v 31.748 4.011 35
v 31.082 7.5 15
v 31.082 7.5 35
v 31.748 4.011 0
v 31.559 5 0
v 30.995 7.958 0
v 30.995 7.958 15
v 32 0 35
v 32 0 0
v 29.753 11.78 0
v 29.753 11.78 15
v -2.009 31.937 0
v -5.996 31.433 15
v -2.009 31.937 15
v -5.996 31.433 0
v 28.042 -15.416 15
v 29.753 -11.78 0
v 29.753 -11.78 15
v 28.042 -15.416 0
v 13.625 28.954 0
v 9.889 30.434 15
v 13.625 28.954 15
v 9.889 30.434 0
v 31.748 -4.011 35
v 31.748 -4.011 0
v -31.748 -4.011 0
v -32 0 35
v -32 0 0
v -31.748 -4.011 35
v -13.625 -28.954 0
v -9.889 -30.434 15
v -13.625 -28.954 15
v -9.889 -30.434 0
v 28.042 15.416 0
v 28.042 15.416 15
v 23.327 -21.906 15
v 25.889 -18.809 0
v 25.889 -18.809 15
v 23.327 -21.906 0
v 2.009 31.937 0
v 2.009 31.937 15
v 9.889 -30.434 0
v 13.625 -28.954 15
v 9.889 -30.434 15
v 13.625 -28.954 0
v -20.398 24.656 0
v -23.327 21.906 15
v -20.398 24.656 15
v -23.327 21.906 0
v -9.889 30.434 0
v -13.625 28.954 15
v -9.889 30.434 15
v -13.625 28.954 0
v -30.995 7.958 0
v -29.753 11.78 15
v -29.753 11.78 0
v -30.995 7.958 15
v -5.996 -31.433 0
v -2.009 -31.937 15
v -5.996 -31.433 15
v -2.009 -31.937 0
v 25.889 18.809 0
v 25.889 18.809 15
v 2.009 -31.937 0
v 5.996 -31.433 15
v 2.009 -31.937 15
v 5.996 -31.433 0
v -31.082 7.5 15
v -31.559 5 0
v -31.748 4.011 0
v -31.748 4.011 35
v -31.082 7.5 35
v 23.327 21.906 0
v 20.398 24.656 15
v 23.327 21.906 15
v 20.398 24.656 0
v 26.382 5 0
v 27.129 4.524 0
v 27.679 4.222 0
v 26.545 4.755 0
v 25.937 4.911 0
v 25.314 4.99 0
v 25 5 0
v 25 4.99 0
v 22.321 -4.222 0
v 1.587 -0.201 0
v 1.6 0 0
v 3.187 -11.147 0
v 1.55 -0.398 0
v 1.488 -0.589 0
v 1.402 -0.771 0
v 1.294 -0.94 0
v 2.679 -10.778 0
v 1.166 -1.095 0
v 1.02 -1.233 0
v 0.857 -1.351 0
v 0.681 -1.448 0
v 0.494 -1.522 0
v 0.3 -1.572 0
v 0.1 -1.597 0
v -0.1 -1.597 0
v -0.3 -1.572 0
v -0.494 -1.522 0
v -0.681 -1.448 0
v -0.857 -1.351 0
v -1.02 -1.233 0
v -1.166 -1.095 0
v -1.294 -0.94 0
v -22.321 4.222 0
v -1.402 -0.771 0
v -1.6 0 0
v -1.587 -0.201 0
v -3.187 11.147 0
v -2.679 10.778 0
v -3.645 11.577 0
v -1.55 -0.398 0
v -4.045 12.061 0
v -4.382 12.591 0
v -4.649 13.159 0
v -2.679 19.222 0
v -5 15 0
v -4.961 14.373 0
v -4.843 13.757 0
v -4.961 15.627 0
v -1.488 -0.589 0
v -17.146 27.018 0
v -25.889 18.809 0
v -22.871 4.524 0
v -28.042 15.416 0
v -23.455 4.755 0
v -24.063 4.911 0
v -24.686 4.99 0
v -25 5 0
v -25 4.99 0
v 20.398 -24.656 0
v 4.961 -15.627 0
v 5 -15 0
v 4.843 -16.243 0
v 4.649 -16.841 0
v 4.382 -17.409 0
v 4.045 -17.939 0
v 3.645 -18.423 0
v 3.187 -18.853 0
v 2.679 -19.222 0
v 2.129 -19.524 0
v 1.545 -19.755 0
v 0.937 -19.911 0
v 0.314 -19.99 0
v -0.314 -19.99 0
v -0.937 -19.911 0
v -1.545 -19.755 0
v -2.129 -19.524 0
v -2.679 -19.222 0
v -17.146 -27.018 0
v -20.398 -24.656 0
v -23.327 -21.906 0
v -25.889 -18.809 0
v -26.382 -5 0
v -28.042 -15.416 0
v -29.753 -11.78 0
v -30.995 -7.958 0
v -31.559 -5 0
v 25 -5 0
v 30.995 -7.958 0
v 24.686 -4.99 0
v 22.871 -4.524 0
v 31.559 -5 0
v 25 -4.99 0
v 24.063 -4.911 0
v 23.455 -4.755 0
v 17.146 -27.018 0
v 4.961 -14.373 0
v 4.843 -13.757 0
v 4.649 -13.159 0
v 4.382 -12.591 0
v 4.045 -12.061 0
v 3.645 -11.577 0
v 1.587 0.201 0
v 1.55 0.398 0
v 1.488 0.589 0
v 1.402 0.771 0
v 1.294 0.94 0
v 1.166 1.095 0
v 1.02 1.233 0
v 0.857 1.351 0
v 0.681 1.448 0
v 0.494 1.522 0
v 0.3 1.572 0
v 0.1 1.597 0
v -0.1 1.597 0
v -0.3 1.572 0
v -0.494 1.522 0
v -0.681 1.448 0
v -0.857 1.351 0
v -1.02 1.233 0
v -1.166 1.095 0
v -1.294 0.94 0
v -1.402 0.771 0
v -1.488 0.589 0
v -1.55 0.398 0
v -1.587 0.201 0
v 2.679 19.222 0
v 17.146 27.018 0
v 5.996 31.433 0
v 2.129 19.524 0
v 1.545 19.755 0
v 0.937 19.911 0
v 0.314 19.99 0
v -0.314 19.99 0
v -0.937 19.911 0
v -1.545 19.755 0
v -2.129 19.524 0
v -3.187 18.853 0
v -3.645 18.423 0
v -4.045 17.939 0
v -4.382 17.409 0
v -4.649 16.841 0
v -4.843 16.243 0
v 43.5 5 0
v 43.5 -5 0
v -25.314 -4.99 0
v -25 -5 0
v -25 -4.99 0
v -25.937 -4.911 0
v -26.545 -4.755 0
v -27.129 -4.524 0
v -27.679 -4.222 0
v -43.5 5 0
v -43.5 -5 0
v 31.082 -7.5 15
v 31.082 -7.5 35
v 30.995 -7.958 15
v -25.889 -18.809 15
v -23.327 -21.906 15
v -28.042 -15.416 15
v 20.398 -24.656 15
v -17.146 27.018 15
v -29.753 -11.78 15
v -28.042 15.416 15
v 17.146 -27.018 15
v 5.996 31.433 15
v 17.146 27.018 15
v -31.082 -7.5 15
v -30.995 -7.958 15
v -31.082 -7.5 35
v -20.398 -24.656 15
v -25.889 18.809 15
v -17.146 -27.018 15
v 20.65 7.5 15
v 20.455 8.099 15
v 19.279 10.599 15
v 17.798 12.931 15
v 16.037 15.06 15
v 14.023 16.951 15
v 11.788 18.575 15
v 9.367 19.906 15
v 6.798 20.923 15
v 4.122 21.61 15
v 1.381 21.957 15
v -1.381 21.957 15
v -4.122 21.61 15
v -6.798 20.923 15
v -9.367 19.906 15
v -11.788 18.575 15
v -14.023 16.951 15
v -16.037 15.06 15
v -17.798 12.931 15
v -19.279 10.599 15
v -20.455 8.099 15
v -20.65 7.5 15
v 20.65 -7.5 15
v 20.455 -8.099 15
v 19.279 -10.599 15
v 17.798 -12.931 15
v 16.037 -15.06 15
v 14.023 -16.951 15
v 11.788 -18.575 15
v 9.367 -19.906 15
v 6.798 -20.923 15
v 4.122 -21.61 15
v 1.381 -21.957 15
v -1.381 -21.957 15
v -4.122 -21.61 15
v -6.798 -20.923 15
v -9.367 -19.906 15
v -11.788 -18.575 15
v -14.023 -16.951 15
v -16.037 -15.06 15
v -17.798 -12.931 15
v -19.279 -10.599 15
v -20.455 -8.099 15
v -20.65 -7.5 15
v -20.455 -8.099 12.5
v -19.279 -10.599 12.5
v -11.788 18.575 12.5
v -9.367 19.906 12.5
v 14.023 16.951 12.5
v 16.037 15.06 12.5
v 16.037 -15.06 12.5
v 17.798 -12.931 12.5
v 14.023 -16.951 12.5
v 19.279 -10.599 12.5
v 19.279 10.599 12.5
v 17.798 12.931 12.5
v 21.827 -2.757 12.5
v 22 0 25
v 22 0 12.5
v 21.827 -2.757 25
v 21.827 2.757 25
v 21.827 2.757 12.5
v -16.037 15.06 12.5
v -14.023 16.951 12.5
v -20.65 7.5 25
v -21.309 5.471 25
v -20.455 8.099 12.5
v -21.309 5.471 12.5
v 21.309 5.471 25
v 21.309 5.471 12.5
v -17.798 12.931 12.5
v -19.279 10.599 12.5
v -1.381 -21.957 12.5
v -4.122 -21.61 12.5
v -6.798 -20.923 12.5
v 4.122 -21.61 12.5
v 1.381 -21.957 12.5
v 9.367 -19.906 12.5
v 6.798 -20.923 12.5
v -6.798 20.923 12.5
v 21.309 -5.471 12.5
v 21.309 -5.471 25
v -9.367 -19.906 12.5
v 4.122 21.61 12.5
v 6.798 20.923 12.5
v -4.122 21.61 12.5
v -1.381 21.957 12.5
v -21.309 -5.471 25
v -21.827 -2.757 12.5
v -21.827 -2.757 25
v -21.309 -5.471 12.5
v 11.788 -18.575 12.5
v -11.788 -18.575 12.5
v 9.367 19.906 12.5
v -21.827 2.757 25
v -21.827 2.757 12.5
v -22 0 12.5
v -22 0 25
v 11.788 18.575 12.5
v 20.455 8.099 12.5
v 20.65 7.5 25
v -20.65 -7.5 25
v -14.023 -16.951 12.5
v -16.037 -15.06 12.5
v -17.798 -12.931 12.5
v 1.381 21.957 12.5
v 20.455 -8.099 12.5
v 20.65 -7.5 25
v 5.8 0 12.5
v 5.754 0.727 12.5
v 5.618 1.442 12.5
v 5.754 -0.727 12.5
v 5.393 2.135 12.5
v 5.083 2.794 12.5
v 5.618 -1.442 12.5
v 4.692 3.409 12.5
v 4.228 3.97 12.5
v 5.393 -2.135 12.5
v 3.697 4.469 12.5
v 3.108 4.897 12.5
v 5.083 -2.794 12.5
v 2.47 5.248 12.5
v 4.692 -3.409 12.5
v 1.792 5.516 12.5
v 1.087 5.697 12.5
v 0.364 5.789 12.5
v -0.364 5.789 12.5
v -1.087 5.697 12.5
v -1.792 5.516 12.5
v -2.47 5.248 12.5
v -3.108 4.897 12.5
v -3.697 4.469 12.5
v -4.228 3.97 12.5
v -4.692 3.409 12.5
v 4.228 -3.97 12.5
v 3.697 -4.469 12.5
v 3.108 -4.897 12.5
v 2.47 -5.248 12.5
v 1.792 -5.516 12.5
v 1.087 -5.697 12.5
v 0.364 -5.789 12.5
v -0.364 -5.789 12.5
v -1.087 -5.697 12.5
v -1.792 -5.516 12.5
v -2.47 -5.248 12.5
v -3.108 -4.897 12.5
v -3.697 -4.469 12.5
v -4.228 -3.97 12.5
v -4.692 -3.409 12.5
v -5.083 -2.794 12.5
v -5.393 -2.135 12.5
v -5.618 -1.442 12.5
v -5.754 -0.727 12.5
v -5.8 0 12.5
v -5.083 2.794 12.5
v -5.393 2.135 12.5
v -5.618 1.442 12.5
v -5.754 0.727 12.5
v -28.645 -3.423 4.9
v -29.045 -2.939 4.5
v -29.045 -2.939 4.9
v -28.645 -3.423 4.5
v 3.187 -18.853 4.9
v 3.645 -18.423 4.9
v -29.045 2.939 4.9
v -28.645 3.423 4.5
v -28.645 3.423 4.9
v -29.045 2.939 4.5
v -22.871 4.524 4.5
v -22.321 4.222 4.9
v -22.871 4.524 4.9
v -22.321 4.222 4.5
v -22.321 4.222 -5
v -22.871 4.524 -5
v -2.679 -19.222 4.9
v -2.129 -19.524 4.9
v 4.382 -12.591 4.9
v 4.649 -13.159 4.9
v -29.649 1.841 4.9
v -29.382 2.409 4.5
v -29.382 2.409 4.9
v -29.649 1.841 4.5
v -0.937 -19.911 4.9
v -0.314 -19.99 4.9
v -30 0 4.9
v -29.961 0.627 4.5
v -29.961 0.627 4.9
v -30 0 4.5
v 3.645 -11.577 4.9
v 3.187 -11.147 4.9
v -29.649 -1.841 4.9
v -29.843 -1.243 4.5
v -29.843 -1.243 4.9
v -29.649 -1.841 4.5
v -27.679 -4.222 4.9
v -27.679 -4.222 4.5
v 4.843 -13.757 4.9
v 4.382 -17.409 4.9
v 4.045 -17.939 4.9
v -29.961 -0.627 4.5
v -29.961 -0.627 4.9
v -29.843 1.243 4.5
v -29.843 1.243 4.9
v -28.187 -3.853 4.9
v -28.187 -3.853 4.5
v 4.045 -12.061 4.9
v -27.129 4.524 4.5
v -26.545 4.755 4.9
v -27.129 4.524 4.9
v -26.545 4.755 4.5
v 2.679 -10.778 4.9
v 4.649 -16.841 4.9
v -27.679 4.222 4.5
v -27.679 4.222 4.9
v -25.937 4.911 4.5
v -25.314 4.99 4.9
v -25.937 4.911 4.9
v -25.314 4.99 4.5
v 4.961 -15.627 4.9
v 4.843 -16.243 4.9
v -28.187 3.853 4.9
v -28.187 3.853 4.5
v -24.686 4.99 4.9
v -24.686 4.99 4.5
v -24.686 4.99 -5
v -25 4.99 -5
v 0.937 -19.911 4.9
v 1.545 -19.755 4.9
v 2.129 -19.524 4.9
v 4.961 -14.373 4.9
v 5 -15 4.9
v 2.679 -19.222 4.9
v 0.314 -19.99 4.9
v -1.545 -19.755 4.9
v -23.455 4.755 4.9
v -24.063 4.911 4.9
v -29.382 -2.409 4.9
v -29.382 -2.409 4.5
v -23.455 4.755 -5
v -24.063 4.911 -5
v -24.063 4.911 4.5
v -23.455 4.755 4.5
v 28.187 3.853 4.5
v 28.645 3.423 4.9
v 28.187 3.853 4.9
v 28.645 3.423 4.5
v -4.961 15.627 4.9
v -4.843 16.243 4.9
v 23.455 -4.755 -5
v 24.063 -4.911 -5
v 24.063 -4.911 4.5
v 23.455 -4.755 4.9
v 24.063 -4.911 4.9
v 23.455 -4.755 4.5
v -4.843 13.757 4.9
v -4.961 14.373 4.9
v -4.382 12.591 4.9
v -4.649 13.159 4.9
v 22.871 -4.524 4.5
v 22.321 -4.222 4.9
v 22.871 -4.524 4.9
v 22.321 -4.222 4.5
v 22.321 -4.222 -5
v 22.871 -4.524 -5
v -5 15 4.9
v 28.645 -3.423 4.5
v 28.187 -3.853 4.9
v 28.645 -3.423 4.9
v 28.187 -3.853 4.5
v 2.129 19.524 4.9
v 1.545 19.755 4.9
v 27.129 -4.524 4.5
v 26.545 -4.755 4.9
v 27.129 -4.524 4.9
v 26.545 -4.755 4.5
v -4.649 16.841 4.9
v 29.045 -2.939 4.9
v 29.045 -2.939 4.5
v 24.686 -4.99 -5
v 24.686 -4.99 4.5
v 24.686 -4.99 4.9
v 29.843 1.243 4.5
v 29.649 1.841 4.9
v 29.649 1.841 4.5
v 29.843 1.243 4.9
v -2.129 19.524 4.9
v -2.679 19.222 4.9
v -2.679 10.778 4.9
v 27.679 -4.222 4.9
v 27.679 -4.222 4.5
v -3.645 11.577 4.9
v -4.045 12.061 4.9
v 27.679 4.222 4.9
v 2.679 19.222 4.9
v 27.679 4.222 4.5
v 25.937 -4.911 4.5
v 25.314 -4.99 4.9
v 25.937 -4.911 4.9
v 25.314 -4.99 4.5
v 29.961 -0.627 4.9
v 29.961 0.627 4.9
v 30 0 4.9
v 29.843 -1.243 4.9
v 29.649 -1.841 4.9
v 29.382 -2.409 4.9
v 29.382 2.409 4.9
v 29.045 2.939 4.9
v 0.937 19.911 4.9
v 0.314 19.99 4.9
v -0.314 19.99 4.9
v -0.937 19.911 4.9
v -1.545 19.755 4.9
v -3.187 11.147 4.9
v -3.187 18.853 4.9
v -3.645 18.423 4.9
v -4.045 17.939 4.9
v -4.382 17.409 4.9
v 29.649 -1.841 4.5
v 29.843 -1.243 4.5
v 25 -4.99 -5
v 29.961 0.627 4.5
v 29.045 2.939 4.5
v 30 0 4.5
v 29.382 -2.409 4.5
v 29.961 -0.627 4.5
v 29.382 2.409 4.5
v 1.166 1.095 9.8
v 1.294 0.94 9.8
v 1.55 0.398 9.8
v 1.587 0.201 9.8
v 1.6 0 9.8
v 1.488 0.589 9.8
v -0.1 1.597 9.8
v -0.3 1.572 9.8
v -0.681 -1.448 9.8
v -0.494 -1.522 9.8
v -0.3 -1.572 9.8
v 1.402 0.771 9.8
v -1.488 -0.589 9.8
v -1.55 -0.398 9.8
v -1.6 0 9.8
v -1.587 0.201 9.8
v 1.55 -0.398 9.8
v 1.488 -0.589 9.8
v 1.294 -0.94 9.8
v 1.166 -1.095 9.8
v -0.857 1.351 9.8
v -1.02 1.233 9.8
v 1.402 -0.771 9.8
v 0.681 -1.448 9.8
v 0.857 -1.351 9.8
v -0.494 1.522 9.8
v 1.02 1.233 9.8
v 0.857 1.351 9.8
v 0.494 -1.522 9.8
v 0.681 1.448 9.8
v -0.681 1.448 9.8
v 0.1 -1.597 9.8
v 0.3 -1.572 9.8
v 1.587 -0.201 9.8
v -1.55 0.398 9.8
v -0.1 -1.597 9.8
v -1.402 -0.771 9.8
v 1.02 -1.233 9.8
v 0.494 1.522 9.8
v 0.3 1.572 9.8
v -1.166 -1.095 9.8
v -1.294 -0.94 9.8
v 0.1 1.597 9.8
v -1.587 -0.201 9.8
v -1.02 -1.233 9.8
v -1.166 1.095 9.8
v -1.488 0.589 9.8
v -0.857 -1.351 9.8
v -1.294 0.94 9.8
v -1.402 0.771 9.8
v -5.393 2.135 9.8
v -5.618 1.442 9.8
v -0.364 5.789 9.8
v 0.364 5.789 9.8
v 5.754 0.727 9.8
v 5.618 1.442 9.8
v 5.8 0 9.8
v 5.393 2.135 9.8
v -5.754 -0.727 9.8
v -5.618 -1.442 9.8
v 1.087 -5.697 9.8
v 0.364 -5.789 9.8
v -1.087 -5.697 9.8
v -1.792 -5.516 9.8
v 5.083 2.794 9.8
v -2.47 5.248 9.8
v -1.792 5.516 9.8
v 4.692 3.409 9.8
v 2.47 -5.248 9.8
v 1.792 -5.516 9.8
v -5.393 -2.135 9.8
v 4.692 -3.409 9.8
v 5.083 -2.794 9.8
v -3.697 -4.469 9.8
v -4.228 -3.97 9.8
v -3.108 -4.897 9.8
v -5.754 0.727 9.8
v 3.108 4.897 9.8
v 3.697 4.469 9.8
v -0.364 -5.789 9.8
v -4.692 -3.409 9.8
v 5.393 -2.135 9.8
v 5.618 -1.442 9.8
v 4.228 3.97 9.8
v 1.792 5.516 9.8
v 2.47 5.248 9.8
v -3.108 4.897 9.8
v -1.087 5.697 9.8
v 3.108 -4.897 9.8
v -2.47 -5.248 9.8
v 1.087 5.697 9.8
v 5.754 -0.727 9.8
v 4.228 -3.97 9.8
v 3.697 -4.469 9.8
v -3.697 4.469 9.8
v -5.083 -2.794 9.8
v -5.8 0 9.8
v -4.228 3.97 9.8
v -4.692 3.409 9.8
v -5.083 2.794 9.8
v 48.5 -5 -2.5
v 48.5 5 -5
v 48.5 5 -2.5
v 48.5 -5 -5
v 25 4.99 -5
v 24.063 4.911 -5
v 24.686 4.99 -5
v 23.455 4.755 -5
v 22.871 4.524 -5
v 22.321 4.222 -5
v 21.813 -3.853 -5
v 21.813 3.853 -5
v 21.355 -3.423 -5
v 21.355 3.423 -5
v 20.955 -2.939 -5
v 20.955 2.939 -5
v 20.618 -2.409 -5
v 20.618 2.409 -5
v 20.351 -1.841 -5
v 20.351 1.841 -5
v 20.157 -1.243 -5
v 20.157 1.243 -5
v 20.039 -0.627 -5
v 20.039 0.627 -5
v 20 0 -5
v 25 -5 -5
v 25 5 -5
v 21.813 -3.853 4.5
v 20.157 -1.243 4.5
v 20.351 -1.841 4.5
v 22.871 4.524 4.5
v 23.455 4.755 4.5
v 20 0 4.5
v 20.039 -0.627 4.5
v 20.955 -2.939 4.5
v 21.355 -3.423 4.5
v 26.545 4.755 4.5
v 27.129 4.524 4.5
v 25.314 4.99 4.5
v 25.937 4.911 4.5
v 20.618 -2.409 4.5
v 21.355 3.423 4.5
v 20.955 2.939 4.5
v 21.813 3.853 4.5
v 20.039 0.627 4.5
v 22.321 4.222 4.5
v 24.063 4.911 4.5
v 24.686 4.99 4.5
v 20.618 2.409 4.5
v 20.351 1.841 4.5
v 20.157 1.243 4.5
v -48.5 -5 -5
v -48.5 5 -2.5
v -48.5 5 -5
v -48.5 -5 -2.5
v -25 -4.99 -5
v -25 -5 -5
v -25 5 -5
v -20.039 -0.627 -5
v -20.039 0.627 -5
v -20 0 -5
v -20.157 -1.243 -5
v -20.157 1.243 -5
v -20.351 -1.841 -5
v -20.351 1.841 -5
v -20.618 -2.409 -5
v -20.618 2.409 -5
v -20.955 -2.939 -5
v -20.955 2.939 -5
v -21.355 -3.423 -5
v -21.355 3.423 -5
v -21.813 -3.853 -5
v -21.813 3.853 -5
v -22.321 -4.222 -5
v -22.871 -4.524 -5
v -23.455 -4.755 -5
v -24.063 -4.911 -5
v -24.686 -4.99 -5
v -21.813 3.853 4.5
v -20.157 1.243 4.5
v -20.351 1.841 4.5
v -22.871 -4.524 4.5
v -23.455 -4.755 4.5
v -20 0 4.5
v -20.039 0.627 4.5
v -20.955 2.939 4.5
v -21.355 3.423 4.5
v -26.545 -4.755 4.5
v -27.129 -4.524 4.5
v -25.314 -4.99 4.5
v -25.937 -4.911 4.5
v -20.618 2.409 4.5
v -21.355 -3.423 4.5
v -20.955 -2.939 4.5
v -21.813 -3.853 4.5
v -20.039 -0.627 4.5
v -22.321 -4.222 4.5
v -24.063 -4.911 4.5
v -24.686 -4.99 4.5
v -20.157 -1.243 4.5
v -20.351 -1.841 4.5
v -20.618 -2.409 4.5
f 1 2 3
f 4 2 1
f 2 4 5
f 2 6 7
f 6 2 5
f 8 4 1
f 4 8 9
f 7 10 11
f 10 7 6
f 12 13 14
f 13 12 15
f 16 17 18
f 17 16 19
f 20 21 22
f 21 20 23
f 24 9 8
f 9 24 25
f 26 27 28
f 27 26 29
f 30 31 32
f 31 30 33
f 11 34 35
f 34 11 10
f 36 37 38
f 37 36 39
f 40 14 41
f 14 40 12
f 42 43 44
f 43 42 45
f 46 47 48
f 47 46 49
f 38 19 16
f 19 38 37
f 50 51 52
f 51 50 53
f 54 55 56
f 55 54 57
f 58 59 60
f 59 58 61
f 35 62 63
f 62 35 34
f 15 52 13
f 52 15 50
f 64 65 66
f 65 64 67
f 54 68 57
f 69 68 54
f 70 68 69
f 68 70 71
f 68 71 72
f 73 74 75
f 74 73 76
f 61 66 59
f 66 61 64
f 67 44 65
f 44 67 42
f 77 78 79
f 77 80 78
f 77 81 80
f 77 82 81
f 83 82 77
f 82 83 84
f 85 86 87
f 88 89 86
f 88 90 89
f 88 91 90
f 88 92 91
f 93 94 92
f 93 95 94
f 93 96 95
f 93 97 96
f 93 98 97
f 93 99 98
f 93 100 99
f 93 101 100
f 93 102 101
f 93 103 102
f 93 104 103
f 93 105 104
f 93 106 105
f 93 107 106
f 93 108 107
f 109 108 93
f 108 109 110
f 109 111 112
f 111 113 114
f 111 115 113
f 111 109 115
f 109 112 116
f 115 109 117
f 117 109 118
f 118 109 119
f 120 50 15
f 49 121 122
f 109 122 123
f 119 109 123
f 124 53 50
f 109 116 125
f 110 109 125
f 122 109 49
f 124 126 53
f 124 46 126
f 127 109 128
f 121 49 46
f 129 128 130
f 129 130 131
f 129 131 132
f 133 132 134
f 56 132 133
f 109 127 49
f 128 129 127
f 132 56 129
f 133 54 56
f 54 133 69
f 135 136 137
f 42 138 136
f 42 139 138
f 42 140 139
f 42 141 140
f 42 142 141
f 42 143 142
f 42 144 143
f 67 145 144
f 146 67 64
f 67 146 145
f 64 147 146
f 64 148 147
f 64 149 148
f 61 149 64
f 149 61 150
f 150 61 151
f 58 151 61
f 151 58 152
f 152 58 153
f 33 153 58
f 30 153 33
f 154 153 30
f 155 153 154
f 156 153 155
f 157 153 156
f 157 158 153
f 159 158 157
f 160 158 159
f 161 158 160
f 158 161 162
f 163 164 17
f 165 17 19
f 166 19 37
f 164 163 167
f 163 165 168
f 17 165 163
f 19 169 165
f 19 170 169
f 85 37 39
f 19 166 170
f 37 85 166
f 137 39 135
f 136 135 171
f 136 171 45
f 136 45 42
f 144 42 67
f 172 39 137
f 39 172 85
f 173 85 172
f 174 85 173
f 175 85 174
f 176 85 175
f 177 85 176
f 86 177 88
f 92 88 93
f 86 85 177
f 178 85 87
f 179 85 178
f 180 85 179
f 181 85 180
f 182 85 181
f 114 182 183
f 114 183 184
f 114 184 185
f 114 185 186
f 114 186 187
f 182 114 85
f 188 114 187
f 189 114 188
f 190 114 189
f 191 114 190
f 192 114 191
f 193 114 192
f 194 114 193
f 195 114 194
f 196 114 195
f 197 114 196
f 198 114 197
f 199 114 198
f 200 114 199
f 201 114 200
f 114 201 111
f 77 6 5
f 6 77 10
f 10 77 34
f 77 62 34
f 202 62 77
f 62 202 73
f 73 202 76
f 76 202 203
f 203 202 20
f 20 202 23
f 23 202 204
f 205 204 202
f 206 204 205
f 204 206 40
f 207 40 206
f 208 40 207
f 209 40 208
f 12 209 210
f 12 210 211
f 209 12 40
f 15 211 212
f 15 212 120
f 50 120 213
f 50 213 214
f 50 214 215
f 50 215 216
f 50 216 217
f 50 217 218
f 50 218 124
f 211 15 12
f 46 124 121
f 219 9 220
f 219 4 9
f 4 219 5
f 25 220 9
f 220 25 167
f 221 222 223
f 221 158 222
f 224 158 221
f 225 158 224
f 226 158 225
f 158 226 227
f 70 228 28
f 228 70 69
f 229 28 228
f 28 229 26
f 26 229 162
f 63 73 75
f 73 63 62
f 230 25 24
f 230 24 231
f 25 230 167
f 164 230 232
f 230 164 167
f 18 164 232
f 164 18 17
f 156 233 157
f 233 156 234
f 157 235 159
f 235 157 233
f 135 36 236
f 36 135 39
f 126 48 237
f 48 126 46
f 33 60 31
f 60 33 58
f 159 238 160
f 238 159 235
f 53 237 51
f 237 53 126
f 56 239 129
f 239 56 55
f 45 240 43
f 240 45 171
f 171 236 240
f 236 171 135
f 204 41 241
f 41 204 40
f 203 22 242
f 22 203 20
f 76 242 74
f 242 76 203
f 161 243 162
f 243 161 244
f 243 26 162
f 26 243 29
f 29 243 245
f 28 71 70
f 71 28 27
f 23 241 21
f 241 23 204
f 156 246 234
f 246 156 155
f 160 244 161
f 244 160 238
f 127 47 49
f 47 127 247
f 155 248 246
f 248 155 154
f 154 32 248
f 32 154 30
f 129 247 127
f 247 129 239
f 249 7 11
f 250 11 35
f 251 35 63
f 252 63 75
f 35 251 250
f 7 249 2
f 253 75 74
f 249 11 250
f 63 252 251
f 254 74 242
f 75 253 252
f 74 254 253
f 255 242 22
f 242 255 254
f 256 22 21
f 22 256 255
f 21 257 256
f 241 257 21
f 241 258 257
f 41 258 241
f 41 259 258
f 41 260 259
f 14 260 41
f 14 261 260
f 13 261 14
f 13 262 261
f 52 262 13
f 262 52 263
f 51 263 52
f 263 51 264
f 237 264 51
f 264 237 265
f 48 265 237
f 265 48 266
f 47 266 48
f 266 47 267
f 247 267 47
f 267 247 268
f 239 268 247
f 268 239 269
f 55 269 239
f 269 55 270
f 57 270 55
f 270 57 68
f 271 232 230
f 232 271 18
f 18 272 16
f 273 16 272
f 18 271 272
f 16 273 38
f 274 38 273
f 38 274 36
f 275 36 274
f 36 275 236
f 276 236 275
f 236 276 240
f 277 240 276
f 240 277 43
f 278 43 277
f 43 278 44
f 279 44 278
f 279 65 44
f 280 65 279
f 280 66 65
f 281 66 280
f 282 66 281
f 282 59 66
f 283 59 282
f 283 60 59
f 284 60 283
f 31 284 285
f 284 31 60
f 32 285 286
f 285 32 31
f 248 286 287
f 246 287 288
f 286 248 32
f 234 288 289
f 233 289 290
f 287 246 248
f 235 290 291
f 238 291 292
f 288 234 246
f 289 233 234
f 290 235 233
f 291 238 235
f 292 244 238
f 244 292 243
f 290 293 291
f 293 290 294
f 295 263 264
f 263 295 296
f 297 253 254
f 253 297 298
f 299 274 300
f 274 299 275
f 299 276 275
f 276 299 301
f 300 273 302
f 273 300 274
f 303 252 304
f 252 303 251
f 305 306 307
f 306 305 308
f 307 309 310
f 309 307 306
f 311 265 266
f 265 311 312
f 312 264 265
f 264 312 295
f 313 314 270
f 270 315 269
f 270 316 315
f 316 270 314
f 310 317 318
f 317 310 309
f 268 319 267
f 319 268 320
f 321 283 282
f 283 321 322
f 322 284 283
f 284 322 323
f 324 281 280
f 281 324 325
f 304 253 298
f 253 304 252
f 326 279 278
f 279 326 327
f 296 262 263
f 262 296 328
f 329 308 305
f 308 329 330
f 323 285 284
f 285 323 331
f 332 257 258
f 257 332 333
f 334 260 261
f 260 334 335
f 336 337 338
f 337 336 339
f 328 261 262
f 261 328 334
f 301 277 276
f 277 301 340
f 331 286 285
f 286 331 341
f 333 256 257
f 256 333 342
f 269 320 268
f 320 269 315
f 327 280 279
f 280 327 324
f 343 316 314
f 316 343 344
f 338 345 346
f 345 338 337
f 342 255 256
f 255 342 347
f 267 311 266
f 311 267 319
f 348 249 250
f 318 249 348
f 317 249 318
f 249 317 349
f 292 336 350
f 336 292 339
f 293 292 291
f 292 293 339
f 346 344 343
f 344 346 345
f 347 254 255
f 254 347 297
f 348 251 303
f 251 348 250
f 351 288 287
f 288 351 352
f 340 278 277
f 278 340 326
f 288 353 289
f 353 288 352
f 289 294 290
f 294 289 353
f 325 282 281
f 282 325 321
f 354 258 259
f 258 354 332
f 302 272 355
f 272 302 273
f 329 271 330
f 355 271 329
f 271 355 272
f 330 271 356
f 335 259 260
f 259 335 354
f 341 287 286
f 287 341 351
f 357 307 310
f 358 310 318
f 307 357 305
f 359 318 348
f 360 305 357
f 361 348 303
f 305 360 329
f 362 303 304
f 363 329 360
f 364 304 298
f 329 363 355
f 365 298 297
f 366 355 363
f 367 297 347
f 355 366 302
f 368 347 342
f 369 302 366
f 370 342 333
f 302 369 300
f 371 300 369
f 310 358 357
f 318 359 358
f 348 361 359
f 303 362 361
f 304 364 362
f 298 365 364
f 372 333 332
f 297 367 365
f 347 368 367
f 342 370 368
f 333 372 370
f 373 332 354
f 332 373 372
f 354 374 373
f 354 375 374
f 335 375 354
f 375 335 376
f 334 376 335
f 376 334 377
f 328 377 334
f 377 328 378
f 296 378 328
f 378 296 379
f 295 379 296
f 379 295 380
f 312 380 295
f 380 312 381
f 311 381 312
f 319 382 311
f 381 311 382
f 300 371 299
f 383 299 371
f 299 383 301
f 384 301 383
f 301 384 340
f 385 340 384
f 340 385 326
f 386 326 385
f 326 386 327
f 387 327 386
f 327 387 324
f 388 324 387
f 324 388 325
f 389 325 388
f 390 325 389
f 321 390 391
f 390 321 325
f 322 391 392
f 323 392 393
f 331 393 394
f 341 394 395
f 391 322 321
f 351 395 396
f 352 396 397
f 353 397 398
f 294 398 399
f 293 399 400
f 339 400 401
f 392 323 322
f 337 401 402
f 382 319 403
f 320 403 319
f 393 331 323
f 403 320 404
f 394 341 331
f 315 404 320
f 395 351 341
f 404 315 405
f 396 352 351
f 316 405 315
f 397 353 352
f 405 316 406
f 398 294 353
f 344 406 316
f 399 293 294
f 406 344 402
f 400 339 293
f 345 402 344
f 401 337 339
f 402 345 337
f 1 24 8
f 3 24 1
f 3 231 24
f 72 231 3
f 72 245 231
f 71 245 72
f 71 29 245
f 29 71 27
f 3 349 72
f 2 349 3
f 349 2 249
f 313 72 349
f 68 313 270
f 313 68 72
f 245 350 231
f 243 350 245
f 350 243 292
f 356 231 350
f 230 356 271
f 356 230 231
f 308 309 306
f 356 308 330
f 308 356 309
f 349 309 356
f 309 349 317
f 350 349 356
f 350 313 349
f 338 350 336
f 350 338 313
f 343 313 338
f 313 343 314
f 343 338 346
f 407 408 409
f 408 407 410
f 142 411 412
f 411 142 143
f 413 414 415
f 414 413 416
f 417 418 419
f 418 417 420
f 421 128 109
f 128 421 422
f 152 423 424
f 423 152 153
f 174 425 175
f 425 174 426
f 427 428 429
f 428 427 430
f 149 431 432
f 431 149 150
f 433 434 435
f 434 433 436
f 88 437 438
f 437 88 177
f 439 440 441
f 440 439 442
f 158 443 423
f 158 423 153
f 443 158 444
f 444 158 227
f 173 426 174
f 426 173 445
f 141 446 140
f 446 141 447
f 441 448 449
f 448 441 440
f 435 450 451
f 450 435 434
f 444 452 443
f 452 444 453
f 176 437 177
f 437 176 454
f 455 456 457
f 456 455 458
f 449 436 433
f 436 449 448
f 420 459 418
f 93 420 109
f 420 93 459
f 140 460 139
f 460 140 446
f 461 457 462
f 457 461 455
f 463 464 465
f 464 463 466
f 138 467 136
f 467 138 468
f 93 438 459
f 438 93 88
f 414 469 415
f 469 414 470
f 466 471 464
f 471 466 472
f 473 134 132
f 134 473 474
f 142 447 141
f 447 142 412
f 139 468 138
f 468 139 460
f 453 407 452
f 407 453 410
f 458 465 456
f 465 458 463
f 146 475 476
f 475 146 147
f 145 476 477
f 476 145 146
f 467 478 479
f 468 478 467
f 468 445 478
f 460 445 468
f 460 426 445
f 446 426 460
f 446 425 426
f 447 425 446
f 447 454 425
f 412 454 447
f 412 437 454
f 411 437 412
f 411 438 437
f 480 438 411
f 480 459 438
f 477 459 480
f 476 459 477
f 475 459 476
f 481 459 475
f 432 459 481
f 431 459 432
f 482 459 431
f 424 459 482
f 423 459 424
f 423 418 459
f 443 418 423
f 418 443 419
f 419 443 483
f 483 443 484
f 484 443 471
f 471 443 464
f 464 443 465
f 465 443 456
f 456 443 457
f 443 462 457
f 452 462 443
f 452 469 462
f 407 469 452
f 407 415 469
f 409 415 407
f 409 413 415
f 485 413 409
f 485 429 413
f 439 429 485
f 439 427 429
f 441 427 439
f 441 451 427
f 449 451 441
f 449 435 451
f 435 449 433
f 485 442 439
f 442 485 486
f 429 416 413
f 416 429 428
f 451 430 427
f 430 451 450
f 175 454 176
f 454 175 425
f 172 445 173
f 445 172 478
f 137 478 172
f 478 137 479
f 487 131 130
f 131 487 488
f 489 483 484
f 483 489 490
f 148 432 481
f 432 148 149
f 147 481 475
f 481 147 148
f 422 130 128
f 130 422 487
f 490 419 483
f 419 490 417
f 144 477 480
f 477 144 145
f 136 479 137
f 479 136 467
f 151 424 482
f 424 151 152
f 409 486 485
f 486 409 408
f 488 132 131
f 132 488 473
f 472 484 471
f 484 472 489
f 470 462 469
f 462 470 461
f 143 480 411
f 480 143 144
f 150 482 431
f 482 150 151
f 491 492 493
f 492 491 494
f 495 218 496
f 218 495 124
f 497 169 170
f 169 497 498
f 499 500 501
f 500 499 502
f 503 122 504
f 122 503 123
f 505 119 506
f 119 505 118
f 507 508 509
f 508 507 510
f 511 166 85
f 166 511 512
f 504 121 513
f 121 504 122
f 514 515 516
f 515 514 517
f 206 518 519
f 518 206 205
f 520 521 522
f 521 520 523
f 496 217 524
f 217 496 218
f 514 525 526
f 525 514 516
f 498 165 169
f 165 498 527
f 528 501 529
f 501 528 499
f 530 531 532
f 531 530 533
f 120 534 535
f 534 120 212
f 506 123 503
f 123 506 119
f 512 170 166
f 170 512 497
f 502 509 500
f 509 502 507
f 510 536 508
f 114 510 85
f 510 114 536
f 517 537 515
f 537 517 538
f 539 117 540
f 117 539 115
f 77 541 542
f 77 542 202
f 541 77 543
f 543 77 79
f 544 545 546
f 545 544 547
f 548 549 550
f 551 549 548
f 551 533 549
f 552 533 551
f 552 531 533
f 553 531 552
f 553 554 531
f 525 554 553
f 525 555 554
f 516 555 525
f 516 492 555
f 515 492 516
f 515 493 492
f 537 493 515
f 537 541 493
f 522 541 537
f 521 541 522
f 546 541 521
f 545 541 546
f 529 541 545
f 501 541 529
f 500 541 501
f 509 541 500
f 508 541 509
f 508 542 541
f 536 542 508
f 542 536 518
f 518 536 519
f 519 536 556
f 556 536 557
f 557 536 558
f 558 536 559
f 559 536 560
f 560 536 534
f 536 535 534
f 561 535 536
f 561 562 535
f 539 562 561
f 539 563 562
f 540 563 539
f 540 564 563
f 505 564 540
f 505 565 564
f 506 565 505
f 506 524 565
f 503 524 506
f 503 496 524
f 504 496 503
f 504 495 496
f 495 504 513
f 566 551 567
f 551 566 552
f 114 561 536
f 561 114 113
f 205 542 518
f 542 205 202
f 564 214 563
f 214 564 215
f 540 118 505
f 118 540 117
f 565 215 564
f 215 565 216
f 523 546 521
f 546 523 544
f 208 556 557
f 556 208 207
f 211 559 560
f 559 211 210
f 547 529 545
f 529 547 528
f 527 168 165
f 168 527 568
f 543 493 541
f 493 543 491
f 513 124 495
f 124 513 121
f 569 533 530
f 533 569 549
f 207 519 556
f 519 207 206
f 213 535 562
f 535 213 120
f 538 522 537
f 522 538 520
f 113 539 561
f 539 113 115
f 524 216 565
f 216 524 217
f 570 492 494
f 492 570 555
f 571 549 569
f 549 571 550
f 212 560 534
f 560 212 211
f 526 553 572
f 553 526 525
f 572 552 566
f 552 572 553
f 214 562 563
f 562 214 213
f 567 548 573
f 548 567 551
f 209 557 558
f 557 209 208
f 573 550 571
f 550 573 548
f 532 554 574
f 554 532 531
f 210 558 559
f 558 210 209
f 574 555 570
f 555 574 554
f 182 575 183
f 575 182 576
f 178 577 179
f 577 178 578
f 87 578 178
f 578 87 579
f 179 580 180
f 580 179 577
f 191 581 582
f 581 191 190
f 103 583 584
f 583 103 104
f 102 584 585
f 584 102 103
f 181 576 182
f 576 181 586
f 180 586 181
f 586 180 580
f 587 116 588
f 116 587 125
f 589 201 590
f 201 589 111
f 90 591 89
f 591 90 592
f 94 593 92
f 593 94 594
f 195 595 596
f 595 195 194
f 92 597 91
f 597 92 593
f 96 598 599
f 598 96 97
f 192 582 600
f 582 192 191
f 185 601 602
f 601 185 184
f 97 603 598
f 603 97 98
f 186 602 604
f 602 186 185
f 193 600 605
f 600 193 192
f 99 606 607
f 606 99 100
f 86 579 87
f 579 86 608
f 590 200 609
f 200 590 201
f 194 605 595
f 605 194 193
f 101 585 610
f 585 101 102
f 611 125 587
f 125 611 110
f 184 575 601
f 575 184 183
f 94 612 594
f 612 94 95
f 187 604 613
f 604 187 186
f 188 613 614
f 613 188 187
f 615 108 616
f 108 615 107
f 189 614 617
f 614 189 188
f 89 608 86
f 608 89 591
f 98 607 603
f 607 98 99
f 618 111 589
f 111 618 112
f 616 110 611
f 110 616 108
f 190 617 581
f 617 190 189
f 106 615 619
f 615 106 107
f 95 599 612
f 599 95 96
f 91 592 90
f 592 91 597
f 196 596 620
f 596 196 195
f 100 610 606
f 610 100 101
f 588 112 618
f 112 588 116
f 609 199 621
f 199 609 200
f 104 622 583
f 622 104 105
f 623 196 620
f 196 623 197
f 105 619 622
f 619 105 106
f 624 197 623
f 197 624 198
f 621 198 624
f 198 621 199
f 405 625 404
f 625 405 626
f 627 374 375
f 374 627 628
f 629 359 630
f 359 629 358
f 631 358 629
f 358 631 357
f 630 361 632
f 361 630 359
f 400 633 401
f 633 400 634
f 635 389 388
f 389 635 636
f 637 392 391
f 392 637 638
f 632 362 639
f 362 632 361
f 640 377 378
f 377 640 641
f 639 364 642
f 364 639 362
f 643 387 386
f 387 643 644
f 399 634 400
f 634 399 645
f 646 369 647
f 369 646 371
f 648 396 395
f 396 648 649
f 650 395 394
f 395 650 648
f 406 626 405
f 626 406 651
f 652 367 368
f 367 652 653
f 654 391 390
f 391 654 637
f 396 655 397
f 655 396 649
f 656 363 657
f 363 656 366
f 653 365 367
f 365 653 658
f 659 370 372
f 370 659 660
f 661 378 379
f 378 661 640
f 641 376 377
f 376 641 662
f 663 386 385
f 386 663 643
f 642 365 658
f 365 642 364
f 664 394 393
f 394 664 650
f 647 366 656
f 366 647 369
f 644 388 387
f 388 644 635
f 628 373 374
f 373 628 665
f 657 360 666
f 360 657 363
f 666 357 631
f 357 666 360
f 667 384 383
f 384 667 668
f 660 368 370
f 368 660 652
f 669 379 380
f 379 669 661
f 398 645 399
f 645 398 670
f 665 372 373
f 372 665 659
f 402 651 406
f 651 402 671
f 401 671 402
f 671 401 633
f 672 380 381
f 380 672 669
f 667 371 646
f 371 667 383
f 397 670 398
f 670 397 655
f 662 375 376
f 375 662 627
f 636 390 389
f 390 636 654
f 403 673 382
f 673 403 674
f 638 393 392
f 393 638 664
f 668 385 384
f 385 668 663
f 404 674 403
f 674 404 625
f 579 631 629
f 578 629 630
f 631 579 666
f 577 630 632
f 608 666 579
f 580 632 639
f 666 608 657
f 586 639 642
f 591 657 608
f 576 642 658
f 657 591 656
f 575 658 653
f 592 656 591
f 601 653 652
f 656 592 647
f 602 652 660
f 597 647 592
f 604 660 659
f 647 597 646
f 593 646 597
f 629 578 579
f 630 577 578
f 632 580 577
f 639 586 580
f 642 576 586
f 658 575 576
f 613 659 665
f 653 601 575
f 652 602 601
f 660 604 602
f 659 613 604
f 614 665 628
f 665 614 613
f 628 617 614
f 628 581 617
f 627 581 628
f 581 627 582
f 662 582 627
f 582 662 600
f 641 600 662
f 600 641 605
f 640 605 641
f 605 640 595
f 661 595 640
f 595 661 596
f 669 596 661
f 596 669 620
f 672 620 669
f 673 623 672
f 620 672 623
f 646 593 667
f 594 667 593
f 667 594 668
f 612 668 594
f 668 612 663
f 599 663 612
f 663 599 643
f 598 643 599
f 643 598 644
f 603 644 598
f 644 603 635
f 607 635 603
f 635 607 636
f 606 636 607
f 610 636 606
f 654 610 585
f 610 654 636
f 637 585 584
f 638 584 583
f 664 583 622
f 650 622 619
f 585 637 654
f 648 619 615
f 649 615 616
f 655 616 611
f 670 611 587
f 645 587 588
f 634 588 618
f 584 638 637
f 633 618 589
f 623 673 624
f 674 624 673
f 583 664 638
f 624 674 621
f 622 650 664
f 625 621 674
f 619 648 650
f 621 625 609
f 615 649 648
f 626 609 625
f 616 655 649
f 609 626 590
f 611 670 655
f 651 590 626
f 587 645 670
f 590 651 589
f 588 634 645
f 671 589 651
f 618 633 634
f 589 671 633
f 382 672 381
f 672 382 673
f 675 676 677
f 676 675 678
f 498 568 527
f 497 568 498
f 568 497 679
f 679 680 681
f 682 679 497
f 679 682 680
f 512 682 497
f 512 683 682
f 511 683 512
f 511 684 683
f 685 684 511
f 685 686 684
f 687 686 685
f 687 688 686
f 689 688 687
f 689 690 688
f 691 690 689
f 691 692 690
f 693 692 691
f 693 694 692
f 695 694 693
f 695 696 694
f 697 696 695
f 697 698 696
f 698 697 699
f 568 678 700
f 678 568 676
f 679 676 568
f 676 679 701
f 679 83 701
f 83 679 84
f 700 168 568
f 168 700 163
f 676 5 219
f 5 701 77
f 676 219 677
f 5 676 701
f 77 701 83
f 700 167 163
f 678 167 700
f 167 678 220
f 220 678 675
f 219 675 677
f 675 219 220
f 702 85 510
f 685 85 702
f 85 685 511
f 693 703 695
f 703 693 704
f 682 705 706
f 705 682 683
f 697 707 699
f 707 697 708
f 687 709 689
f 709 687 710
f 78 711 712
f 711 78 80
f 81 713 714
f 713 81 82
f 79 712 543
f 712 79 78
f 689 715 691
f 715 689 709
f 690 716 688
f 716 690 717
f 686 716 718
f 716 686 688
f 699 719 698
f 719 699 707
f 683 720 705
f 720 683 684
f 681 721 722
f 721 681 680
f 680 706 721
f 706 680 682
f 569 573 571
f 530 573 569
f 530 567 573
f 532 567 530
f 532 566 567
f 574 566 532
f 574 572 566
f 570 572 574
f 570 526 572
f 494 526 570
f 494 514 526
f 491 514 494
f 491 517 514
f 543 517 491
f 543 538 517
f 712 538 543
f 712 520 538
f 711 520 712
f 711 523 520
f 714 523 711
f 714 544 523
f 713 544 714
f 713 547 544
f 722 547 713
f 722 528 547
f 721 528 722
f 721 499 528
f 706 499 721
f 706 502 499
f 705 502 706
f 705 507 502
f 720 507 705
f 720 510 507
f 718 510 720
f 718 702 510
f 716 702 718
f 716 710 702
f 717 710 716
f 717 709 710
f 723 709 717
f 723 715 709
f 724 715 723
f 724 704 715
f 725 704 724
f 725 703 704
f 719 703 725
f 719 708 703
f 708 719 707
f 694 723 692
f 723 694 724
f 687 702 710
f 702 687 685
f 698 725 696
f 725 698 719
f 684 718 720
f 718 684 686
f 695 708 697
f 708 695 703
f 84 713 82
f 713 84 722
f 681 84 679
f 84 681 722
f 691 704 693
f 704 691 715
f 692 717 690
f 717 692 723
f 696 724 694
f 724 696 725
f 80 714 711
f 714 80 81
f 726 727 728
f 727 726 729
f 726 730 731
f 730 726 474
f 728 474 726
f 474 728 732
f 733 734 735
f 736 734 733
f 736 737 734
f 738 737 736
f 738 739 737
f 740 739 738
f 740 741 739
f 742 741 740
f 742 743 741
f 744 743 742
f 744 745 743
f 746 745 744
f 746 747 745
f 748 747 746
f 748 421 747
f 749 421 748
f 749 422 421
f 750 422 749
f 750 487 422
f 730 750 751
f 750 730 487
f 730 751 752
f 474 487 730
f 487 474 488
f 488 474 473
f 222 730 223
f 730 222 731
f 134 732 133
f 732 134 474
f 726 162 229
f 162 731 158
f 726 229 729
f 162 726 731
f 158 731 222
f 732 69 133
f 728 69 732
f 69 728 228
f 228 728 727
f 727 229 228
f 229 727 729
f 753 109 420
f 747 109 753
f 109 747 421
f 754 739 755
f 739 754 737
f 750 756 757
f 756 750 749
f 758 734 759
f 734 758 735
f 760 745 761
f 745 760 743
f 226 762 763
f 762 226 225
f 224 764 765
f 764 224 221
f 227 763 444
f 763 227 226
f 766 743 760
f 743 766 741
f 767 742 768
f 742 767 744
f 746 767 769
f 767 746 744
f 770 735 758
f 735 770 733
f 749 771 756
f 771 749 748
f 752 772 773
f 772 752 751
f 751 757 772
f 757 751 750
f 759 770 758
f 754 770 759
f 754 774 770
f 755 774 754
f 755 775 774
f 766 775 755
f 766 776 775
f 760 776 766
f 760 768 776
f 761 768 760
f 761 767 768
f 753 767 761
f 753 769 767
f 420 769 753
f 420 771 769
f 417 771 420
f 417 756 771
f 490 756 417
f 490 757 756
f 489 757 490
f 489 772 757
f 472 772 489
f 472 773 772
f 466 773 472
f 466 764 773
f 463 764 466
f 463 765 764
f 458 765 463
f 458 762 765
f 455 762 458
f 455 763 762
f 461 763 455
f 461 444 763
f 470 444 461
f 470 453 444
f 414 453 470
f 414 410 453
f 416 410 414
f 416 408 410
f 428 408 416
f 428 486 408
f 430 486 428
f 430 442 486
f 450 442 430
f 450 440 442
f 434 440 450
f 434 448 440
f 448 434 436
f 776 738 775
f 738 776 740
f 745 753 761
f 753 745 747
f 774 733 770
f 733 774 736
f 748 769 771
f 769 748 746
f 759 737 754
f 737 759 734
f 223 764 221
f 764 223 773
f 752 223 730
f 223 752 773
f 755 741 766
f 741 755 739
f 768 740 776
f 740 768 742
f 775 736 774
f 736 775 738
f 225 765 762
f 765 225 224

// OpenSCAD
// file: parameters.scad
arm_n = 6;
rotor_diameter = 250;
drone_diameter = (rotor_diameter/sin(180/arm_n));

global_clearence = 0.1;


// M3 parameters =========================================
M3_screw_diameter = 3.2;
M3_nut_height = 2.7;
M3_nut_diameter = 6.6;
M3_nut_pocket = 5.6;


// Battery size ==========================================
battery_length = 195;
battery_height = 91;
battery_width = 64;


// 3D printer para. ======================================
print_plate_x = 200;
print_plate_y = 220;


// motor parameters ======================================
motor_diameter = 40;
motor_height = 18;
motor_n_screws = 4;
motor_screws_diameter = 20;


// motor holder para. (666_1001) =========================
motor_plate_height = 7;
motor_plate_diameter = motor_diameter;
motor_plate_hole_diameter = 10;
motor_tube_x_offset = motor_diameter/2 - 5;
motor_tube_z_offset = 20;

screws_n = 2;
screws_gap = 15;
screws_offset_x = 7.5;
screws_offset_y = 5;
holding_part_x = 30;
upper_holding_part_height = 15;
washer_size_x = 10;


// avionics plate para. (666_1003) =======================
avionics_plate_diameter = 200;
avionics_plate_height = 3;
avionics_plate_z_offset = 25;

av_screws_diameter = 160;
av_cable_holes_offset = 70;
av_cable_holes_width = 8;
av_cable_holes_length = 20;


// mid poly base para. (666_1004) ========================
mid_poly_diameter = 120;
mid_poly_low_diameter = mid_poly_diameter*cos(180/arm_n);
mid_poly_side = mid_poly_low_diameter*tan(180/arm_n);


// arm pipe para. (888_1002) =============================
arm_pipe_diameter = 20;
arm_pipe_inner_diameter = 18;
arm_pipe_x_offset = mid_poly_low_diameter/2-.1;
arm_pipe_z_offset = 5;
arm_pipe_length = drone_diameter-motor_tube_x_offset-arm_pipe_x_offset;


// main base para. (666_1004) ============================
base_diameter = 300;
base_height = 40;
base_bottom_height = base_height/2;
base_arm_screw_x_offset = 5;

base_low_diameter = base_diameter*cos(180/arm_n);
base_side = base_low_diameter*tan(180/arm_n);
base_arm_washer_width = 10;
base_middle_hole_diameter = 70;
base_middle_screws_diameter = base_middle_hole_diameter+10;

screws_x_offset_inside = 5;
screws_x_offset_outside = 15;
screws_y_offset = 2.5;
screws_z_offset = (base_bottom_height-arm_pipe_diameter/2)/2;

cutting_edge_width = 10;
screws_joining_sides_diameter = base_diameter-50;


// battery module  para. (666_1005) =======================
battery_cartridge_width = battery_height+6;
battery_cartridge_height = battery_width+6;


// battery module mechanism para. (666_1005) =======================
locking_y_travel = 10;
locking_ring_diameter = battery_width;
locking_ring_height = 15;
locking_ring_handle_offset = 20;
locking_ring_handle_height = 10;
locking_ring_handle_width = 15;
locking_ring_hole_diameter = locking_ring_diameter-20;
locking_ring_hole_depth = locking_ring_height/2-5;
locking_slot_diameter = 10;
locking_slot_height = 5;
locking_slot_offset = 10;
locking_teeth_cut_offset = 5;
locking_teeth_height = 5;
locking_teeth_slot_length = (battery_cartridge_width-locking_ring_diameter-2*locking_y_travel)/2;
locking_teeth_offset = locking_ring_diameter/2-locking_slot_diameter-locking_y_travel-locking_slot_offset;


// mid poly if base cant fit =============================
base_can_fit = base_diameter <= min(print_plate_x,print_plate_y) ? true : false;
// main file
include <parameters.scad>;


module 666_1005_locking_cylinder(draft) {
    difference() {
        union() {
            difference() {
                cylinder(locking_ring_height,d=locking_ring_diameter,$fn = draft ? 10 : 50);
                translate([0,0,locking_ring_height-locking_ring_hole_depth])
                cylinder(locking_ring_height,d=locking_ring_hole_diameter,$fn = draft ? 10 : 50);
            }
            
            // handle
            intersection() {
                difference() {
                    translate([-locking_ring_diameter/2,-locking_ring_handle_width/2,0])
                    cube([locking_ring_diameter,locking_ring_handle_width,locking_ring_height+locking_ring_handle_offset]);
                    
                    
                    translate([0,0,locking_ring_height-locking_ring_hole_depth])
                    cylinder(locking_ring_hole_depth+locking_ring_handle_offset-locking_ring_handle_height,d=locking_ring_hole_diameter,$fn = draft ? 10 : 50);
                }
                
                
                cylinder(locking_ring_height+locking_ring_handle_offset,d=locking_ring_diameter,$fn = draft ? 10 : 50);
            }
        }
        
        // locking slots
        hull() {
        translate([0,-(locking_slot_offset+locking_slot_diameter/2),-.1])
        cylinder(locking_slot_height,d=locking_slot_diameter,$fn = draft ? 10 : 50);
        
        translate([-(locking_slot_offset+locking_slot_diameter/2+locking_y_travel),0,-.1])
        cylinder(locking_slot_height,d=locking_slot_diameter,$fn = draft ? 10 : 50);
        }
        hull() {
        translate([0,locking_slot_offset+locking_slot_diameter/2,-.1])
        cylinder(locking_slot_height,d=locking_slot_diameter,$fn = draft ? 10 : 50);
        
        translate([locking_slot_offset+locking_slot_diameter/2+locking_y_travel,0,-.1])
        cylinder(locking_slot_height,d=locking_slot_diameter,$fn = draft ? 10 : 50);
        }
            
        // holding screw
        translate([0,0,-1])
        cylinder(+locking_ring_handle_offset+2,d=M3_screw_diameter,$fn = draft ? 10 : 50);
        translate([0,0,locking_ring_height-locking_ring_hole_depth-M3_nut_height])
        cylinder(M3_nut_height+1,d=M3_nut_diameter+5,$fn = draft ? 10 : 50);
        
        
    }
}




module 666_1005_locking_teeth(draft) {
    union() {
        difference() {
            // main tooth
            translate([locking_slot_diameter/2,-locking_slot_diameter/2,0])
            cube([locking_y_travel+locking_slot_diameter/2+locking_teeth_slot_length+locking_teeth_offset,locking_slot_diameter,locking_teeth_height]);
            
            // cutting edge
            hull() {
                translate([locking_y_travel+locking_slot_diameter+locking_teeth_slot_length-locking_teeth_cut_offset+locking_teeth_offset,-locking_slot_diameter/2-1,locking_teeth_height])
                cube([1,locking_slot_diameter+2,locking_teeth_height]);
                translate([locking_y_travel+locking_slot_diameter+locking_teeth_slot_length+locking_teeth_offset,-locking_slot_diameter/2-1,locking_teeth_height/2])
                cube([1,locking_slot_diameter+2,locking_teeth_height]);
            }
        }
        
        // slot cylinder
        translate([locking_slot_diameter/2,0,0])
        cylinder(locking_slot_height-0.5+locking_teeth_height,d=locking_slot_diameter,$fn = draft ? 10 : 50);

    }

}




module 666_1005(draft) {
    
}



666_1005_locking_cylinder();

translate([locking_slot_offset+locking_y_travel,0,-locking_teeth_height])
666_1005_locking_teeth();

rotate([0,0,180])
translate([locking_slot_offset+locking_y_travel,0,-locking_teeth_height])
666_1005_locking_teeth();
